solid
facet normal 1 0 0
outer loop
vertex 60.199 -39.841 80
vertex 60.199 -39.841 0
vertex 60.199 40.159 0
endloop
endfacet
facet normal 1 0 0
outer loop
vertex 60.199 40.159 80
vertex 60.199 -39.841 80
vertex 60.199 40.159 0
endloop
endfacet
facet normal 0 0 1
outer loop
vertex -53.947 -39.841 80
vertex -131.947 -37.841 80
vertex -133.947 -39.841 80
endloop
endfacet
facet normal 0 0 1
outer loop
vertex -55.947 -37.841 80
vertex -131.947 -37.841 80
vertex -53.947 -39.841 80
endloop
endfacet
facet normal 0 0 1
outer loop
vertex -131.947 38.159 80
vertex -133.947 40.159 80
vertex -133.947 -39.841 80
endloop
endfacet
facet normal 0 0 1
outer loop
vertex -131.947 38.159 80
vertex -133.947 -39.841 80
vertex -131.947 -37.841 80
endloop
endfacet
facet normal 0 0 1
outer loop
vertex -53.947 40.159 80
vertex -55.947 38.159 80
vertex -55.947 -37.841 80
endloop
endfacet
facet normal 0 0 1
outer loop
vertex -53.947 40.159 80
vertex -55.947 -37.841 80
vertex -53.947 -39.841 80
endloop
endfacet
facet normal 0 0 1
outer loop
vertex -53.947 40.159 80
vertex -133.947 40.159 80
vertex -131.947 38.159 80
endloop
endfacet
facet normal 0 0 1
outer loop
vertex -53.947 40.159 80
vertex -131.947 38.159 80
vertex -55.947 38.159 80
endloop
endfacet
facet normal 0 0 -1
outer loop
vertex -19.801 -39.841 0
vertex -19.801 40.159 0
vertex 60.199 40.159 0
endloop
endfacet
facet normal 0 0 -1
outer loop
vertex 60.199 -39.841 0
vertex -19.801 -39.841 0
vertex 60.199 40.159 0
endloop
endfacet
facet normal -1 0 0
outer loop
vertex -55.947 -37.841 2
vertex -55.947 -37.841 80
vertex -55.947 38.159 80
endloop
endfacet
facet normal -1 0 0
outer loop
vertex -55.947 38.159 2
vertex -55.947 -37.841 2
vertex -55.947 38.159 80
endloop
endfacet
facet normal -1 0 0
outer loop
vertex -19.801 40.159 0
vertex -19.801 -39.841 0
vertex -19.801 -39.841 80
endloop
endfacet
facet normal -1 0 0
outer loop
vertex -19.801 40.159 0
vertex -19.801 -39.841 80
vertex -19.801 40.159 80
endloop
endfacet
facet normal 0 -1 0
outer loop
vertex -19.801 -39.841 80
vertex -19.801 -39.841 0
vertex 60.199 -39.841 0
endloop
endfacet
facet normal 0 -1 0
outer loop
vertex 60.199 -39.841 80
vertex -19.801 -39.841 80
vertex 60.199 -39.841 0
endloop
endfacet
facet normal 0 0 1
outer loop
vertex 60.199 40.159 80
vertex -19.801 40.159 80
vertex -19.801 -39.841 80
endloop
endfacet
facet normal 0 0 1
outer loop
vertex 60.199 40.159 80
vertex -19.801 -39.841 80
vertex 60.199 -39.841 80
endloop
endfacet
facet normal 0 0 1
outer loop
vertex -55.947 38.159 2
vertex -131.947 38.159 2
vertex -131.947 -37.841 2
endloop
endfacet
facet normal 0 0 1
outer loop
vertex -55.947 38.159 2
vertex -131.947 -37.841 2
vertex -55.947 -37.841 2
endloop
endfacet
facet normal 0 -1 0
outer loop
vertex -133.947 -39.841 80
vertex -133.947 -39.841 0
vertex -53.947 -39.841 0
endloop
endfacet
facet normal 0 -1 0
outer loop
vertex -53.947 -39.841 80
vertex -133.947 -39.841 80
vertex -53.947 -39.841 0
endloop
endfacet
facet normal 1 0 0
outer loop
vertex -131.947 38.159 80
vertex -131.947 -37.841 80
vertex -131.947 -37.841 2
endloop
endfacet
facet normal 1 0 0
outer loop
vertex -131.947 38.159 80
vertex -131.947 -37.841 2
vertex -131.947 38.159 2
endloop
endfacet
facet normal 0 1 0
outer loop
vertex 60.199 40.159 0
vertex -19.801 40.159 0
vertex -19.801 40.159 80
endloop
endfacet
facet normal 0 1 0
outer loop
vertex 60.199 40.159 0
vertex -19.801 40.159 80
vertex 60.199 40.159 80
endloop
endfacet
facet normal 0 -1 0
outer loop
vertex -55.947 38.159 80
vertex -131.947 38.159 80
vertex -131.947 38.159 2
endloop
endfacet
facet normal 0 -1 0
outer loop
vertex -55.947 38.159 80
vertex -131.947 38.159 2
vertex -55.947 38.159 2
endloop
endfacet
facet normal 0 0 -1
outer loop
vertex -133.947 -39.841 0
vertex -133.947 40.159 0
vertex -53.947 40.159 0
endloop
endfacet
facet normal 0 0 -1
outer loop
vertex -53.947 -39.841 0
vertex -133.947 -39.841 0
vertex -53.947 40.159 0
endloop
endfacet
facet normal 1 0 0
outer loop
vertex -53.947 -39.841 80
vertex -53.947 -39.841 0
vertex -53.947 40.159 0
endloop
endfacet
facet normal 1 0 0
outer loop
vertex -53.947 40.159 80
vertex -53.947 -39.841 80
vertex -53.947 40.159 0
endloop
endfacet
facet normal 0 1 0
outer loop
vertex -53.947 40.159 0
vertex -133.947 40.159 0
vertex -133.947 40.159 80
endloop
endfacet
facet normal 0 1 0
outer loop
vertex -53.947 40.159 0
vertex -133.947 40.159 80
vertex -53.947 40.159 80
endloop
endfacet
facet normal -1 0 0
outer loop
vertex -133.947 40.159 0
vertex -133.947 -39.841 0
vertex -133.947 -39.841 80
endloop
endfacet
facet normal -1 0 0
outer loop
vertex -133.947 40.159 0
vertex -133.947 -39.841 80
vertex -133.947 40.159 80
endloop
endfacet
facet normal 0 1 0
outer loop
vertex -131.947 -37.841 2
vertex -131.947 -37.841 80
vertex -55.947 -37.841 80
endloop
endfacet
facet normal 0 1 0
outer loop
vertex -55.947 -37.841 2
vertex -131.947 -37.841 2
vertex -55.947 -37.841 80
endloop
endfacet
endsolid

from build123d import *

# Parameters (mm, degrees)
F0_W     = 80
F0_H     = 80
F1_DEPTH = 80
F2_DEPTH = 80
F3_W     = 76
F3_H     = 76
F4_DEPTH = 78


with BuildPart() as f1:
    # F0 (on Top) → F1 (new body)
    with BuildSketch(Plane.XY):
        with Locations((-93.947144, 0.158527)):
            Rectangle(F0_W, F0_H)
    extrude(amount=F1_DEPTH)


with BuildPart() as f2:
    # F0 (on Top) → F2 (new body)
    with BuildSketch(Plane.XY):
        with Locations((20.198832, 0.158527)):
            Rectangle(F0_W, F0_H)
    extrude(amount=F2_DEPTH)


with BuildPart() as f4:
    # F3 (on face) → F4 (new body)
    with BuildSketch(Plane.XY.offset(80)):
        with Locations((-93.947144, 0.158527)):
            Rectangle(F3_W, F3_H)
    extrude(amount=-F4_DEPTH)


with BuildPart() as f1_1:
    add(f1.part)

    # F5: cut F4
    add(f4.part, mode=Mode.SUBTRACT)


solid = Compound([f2.part, f1_1.part])
